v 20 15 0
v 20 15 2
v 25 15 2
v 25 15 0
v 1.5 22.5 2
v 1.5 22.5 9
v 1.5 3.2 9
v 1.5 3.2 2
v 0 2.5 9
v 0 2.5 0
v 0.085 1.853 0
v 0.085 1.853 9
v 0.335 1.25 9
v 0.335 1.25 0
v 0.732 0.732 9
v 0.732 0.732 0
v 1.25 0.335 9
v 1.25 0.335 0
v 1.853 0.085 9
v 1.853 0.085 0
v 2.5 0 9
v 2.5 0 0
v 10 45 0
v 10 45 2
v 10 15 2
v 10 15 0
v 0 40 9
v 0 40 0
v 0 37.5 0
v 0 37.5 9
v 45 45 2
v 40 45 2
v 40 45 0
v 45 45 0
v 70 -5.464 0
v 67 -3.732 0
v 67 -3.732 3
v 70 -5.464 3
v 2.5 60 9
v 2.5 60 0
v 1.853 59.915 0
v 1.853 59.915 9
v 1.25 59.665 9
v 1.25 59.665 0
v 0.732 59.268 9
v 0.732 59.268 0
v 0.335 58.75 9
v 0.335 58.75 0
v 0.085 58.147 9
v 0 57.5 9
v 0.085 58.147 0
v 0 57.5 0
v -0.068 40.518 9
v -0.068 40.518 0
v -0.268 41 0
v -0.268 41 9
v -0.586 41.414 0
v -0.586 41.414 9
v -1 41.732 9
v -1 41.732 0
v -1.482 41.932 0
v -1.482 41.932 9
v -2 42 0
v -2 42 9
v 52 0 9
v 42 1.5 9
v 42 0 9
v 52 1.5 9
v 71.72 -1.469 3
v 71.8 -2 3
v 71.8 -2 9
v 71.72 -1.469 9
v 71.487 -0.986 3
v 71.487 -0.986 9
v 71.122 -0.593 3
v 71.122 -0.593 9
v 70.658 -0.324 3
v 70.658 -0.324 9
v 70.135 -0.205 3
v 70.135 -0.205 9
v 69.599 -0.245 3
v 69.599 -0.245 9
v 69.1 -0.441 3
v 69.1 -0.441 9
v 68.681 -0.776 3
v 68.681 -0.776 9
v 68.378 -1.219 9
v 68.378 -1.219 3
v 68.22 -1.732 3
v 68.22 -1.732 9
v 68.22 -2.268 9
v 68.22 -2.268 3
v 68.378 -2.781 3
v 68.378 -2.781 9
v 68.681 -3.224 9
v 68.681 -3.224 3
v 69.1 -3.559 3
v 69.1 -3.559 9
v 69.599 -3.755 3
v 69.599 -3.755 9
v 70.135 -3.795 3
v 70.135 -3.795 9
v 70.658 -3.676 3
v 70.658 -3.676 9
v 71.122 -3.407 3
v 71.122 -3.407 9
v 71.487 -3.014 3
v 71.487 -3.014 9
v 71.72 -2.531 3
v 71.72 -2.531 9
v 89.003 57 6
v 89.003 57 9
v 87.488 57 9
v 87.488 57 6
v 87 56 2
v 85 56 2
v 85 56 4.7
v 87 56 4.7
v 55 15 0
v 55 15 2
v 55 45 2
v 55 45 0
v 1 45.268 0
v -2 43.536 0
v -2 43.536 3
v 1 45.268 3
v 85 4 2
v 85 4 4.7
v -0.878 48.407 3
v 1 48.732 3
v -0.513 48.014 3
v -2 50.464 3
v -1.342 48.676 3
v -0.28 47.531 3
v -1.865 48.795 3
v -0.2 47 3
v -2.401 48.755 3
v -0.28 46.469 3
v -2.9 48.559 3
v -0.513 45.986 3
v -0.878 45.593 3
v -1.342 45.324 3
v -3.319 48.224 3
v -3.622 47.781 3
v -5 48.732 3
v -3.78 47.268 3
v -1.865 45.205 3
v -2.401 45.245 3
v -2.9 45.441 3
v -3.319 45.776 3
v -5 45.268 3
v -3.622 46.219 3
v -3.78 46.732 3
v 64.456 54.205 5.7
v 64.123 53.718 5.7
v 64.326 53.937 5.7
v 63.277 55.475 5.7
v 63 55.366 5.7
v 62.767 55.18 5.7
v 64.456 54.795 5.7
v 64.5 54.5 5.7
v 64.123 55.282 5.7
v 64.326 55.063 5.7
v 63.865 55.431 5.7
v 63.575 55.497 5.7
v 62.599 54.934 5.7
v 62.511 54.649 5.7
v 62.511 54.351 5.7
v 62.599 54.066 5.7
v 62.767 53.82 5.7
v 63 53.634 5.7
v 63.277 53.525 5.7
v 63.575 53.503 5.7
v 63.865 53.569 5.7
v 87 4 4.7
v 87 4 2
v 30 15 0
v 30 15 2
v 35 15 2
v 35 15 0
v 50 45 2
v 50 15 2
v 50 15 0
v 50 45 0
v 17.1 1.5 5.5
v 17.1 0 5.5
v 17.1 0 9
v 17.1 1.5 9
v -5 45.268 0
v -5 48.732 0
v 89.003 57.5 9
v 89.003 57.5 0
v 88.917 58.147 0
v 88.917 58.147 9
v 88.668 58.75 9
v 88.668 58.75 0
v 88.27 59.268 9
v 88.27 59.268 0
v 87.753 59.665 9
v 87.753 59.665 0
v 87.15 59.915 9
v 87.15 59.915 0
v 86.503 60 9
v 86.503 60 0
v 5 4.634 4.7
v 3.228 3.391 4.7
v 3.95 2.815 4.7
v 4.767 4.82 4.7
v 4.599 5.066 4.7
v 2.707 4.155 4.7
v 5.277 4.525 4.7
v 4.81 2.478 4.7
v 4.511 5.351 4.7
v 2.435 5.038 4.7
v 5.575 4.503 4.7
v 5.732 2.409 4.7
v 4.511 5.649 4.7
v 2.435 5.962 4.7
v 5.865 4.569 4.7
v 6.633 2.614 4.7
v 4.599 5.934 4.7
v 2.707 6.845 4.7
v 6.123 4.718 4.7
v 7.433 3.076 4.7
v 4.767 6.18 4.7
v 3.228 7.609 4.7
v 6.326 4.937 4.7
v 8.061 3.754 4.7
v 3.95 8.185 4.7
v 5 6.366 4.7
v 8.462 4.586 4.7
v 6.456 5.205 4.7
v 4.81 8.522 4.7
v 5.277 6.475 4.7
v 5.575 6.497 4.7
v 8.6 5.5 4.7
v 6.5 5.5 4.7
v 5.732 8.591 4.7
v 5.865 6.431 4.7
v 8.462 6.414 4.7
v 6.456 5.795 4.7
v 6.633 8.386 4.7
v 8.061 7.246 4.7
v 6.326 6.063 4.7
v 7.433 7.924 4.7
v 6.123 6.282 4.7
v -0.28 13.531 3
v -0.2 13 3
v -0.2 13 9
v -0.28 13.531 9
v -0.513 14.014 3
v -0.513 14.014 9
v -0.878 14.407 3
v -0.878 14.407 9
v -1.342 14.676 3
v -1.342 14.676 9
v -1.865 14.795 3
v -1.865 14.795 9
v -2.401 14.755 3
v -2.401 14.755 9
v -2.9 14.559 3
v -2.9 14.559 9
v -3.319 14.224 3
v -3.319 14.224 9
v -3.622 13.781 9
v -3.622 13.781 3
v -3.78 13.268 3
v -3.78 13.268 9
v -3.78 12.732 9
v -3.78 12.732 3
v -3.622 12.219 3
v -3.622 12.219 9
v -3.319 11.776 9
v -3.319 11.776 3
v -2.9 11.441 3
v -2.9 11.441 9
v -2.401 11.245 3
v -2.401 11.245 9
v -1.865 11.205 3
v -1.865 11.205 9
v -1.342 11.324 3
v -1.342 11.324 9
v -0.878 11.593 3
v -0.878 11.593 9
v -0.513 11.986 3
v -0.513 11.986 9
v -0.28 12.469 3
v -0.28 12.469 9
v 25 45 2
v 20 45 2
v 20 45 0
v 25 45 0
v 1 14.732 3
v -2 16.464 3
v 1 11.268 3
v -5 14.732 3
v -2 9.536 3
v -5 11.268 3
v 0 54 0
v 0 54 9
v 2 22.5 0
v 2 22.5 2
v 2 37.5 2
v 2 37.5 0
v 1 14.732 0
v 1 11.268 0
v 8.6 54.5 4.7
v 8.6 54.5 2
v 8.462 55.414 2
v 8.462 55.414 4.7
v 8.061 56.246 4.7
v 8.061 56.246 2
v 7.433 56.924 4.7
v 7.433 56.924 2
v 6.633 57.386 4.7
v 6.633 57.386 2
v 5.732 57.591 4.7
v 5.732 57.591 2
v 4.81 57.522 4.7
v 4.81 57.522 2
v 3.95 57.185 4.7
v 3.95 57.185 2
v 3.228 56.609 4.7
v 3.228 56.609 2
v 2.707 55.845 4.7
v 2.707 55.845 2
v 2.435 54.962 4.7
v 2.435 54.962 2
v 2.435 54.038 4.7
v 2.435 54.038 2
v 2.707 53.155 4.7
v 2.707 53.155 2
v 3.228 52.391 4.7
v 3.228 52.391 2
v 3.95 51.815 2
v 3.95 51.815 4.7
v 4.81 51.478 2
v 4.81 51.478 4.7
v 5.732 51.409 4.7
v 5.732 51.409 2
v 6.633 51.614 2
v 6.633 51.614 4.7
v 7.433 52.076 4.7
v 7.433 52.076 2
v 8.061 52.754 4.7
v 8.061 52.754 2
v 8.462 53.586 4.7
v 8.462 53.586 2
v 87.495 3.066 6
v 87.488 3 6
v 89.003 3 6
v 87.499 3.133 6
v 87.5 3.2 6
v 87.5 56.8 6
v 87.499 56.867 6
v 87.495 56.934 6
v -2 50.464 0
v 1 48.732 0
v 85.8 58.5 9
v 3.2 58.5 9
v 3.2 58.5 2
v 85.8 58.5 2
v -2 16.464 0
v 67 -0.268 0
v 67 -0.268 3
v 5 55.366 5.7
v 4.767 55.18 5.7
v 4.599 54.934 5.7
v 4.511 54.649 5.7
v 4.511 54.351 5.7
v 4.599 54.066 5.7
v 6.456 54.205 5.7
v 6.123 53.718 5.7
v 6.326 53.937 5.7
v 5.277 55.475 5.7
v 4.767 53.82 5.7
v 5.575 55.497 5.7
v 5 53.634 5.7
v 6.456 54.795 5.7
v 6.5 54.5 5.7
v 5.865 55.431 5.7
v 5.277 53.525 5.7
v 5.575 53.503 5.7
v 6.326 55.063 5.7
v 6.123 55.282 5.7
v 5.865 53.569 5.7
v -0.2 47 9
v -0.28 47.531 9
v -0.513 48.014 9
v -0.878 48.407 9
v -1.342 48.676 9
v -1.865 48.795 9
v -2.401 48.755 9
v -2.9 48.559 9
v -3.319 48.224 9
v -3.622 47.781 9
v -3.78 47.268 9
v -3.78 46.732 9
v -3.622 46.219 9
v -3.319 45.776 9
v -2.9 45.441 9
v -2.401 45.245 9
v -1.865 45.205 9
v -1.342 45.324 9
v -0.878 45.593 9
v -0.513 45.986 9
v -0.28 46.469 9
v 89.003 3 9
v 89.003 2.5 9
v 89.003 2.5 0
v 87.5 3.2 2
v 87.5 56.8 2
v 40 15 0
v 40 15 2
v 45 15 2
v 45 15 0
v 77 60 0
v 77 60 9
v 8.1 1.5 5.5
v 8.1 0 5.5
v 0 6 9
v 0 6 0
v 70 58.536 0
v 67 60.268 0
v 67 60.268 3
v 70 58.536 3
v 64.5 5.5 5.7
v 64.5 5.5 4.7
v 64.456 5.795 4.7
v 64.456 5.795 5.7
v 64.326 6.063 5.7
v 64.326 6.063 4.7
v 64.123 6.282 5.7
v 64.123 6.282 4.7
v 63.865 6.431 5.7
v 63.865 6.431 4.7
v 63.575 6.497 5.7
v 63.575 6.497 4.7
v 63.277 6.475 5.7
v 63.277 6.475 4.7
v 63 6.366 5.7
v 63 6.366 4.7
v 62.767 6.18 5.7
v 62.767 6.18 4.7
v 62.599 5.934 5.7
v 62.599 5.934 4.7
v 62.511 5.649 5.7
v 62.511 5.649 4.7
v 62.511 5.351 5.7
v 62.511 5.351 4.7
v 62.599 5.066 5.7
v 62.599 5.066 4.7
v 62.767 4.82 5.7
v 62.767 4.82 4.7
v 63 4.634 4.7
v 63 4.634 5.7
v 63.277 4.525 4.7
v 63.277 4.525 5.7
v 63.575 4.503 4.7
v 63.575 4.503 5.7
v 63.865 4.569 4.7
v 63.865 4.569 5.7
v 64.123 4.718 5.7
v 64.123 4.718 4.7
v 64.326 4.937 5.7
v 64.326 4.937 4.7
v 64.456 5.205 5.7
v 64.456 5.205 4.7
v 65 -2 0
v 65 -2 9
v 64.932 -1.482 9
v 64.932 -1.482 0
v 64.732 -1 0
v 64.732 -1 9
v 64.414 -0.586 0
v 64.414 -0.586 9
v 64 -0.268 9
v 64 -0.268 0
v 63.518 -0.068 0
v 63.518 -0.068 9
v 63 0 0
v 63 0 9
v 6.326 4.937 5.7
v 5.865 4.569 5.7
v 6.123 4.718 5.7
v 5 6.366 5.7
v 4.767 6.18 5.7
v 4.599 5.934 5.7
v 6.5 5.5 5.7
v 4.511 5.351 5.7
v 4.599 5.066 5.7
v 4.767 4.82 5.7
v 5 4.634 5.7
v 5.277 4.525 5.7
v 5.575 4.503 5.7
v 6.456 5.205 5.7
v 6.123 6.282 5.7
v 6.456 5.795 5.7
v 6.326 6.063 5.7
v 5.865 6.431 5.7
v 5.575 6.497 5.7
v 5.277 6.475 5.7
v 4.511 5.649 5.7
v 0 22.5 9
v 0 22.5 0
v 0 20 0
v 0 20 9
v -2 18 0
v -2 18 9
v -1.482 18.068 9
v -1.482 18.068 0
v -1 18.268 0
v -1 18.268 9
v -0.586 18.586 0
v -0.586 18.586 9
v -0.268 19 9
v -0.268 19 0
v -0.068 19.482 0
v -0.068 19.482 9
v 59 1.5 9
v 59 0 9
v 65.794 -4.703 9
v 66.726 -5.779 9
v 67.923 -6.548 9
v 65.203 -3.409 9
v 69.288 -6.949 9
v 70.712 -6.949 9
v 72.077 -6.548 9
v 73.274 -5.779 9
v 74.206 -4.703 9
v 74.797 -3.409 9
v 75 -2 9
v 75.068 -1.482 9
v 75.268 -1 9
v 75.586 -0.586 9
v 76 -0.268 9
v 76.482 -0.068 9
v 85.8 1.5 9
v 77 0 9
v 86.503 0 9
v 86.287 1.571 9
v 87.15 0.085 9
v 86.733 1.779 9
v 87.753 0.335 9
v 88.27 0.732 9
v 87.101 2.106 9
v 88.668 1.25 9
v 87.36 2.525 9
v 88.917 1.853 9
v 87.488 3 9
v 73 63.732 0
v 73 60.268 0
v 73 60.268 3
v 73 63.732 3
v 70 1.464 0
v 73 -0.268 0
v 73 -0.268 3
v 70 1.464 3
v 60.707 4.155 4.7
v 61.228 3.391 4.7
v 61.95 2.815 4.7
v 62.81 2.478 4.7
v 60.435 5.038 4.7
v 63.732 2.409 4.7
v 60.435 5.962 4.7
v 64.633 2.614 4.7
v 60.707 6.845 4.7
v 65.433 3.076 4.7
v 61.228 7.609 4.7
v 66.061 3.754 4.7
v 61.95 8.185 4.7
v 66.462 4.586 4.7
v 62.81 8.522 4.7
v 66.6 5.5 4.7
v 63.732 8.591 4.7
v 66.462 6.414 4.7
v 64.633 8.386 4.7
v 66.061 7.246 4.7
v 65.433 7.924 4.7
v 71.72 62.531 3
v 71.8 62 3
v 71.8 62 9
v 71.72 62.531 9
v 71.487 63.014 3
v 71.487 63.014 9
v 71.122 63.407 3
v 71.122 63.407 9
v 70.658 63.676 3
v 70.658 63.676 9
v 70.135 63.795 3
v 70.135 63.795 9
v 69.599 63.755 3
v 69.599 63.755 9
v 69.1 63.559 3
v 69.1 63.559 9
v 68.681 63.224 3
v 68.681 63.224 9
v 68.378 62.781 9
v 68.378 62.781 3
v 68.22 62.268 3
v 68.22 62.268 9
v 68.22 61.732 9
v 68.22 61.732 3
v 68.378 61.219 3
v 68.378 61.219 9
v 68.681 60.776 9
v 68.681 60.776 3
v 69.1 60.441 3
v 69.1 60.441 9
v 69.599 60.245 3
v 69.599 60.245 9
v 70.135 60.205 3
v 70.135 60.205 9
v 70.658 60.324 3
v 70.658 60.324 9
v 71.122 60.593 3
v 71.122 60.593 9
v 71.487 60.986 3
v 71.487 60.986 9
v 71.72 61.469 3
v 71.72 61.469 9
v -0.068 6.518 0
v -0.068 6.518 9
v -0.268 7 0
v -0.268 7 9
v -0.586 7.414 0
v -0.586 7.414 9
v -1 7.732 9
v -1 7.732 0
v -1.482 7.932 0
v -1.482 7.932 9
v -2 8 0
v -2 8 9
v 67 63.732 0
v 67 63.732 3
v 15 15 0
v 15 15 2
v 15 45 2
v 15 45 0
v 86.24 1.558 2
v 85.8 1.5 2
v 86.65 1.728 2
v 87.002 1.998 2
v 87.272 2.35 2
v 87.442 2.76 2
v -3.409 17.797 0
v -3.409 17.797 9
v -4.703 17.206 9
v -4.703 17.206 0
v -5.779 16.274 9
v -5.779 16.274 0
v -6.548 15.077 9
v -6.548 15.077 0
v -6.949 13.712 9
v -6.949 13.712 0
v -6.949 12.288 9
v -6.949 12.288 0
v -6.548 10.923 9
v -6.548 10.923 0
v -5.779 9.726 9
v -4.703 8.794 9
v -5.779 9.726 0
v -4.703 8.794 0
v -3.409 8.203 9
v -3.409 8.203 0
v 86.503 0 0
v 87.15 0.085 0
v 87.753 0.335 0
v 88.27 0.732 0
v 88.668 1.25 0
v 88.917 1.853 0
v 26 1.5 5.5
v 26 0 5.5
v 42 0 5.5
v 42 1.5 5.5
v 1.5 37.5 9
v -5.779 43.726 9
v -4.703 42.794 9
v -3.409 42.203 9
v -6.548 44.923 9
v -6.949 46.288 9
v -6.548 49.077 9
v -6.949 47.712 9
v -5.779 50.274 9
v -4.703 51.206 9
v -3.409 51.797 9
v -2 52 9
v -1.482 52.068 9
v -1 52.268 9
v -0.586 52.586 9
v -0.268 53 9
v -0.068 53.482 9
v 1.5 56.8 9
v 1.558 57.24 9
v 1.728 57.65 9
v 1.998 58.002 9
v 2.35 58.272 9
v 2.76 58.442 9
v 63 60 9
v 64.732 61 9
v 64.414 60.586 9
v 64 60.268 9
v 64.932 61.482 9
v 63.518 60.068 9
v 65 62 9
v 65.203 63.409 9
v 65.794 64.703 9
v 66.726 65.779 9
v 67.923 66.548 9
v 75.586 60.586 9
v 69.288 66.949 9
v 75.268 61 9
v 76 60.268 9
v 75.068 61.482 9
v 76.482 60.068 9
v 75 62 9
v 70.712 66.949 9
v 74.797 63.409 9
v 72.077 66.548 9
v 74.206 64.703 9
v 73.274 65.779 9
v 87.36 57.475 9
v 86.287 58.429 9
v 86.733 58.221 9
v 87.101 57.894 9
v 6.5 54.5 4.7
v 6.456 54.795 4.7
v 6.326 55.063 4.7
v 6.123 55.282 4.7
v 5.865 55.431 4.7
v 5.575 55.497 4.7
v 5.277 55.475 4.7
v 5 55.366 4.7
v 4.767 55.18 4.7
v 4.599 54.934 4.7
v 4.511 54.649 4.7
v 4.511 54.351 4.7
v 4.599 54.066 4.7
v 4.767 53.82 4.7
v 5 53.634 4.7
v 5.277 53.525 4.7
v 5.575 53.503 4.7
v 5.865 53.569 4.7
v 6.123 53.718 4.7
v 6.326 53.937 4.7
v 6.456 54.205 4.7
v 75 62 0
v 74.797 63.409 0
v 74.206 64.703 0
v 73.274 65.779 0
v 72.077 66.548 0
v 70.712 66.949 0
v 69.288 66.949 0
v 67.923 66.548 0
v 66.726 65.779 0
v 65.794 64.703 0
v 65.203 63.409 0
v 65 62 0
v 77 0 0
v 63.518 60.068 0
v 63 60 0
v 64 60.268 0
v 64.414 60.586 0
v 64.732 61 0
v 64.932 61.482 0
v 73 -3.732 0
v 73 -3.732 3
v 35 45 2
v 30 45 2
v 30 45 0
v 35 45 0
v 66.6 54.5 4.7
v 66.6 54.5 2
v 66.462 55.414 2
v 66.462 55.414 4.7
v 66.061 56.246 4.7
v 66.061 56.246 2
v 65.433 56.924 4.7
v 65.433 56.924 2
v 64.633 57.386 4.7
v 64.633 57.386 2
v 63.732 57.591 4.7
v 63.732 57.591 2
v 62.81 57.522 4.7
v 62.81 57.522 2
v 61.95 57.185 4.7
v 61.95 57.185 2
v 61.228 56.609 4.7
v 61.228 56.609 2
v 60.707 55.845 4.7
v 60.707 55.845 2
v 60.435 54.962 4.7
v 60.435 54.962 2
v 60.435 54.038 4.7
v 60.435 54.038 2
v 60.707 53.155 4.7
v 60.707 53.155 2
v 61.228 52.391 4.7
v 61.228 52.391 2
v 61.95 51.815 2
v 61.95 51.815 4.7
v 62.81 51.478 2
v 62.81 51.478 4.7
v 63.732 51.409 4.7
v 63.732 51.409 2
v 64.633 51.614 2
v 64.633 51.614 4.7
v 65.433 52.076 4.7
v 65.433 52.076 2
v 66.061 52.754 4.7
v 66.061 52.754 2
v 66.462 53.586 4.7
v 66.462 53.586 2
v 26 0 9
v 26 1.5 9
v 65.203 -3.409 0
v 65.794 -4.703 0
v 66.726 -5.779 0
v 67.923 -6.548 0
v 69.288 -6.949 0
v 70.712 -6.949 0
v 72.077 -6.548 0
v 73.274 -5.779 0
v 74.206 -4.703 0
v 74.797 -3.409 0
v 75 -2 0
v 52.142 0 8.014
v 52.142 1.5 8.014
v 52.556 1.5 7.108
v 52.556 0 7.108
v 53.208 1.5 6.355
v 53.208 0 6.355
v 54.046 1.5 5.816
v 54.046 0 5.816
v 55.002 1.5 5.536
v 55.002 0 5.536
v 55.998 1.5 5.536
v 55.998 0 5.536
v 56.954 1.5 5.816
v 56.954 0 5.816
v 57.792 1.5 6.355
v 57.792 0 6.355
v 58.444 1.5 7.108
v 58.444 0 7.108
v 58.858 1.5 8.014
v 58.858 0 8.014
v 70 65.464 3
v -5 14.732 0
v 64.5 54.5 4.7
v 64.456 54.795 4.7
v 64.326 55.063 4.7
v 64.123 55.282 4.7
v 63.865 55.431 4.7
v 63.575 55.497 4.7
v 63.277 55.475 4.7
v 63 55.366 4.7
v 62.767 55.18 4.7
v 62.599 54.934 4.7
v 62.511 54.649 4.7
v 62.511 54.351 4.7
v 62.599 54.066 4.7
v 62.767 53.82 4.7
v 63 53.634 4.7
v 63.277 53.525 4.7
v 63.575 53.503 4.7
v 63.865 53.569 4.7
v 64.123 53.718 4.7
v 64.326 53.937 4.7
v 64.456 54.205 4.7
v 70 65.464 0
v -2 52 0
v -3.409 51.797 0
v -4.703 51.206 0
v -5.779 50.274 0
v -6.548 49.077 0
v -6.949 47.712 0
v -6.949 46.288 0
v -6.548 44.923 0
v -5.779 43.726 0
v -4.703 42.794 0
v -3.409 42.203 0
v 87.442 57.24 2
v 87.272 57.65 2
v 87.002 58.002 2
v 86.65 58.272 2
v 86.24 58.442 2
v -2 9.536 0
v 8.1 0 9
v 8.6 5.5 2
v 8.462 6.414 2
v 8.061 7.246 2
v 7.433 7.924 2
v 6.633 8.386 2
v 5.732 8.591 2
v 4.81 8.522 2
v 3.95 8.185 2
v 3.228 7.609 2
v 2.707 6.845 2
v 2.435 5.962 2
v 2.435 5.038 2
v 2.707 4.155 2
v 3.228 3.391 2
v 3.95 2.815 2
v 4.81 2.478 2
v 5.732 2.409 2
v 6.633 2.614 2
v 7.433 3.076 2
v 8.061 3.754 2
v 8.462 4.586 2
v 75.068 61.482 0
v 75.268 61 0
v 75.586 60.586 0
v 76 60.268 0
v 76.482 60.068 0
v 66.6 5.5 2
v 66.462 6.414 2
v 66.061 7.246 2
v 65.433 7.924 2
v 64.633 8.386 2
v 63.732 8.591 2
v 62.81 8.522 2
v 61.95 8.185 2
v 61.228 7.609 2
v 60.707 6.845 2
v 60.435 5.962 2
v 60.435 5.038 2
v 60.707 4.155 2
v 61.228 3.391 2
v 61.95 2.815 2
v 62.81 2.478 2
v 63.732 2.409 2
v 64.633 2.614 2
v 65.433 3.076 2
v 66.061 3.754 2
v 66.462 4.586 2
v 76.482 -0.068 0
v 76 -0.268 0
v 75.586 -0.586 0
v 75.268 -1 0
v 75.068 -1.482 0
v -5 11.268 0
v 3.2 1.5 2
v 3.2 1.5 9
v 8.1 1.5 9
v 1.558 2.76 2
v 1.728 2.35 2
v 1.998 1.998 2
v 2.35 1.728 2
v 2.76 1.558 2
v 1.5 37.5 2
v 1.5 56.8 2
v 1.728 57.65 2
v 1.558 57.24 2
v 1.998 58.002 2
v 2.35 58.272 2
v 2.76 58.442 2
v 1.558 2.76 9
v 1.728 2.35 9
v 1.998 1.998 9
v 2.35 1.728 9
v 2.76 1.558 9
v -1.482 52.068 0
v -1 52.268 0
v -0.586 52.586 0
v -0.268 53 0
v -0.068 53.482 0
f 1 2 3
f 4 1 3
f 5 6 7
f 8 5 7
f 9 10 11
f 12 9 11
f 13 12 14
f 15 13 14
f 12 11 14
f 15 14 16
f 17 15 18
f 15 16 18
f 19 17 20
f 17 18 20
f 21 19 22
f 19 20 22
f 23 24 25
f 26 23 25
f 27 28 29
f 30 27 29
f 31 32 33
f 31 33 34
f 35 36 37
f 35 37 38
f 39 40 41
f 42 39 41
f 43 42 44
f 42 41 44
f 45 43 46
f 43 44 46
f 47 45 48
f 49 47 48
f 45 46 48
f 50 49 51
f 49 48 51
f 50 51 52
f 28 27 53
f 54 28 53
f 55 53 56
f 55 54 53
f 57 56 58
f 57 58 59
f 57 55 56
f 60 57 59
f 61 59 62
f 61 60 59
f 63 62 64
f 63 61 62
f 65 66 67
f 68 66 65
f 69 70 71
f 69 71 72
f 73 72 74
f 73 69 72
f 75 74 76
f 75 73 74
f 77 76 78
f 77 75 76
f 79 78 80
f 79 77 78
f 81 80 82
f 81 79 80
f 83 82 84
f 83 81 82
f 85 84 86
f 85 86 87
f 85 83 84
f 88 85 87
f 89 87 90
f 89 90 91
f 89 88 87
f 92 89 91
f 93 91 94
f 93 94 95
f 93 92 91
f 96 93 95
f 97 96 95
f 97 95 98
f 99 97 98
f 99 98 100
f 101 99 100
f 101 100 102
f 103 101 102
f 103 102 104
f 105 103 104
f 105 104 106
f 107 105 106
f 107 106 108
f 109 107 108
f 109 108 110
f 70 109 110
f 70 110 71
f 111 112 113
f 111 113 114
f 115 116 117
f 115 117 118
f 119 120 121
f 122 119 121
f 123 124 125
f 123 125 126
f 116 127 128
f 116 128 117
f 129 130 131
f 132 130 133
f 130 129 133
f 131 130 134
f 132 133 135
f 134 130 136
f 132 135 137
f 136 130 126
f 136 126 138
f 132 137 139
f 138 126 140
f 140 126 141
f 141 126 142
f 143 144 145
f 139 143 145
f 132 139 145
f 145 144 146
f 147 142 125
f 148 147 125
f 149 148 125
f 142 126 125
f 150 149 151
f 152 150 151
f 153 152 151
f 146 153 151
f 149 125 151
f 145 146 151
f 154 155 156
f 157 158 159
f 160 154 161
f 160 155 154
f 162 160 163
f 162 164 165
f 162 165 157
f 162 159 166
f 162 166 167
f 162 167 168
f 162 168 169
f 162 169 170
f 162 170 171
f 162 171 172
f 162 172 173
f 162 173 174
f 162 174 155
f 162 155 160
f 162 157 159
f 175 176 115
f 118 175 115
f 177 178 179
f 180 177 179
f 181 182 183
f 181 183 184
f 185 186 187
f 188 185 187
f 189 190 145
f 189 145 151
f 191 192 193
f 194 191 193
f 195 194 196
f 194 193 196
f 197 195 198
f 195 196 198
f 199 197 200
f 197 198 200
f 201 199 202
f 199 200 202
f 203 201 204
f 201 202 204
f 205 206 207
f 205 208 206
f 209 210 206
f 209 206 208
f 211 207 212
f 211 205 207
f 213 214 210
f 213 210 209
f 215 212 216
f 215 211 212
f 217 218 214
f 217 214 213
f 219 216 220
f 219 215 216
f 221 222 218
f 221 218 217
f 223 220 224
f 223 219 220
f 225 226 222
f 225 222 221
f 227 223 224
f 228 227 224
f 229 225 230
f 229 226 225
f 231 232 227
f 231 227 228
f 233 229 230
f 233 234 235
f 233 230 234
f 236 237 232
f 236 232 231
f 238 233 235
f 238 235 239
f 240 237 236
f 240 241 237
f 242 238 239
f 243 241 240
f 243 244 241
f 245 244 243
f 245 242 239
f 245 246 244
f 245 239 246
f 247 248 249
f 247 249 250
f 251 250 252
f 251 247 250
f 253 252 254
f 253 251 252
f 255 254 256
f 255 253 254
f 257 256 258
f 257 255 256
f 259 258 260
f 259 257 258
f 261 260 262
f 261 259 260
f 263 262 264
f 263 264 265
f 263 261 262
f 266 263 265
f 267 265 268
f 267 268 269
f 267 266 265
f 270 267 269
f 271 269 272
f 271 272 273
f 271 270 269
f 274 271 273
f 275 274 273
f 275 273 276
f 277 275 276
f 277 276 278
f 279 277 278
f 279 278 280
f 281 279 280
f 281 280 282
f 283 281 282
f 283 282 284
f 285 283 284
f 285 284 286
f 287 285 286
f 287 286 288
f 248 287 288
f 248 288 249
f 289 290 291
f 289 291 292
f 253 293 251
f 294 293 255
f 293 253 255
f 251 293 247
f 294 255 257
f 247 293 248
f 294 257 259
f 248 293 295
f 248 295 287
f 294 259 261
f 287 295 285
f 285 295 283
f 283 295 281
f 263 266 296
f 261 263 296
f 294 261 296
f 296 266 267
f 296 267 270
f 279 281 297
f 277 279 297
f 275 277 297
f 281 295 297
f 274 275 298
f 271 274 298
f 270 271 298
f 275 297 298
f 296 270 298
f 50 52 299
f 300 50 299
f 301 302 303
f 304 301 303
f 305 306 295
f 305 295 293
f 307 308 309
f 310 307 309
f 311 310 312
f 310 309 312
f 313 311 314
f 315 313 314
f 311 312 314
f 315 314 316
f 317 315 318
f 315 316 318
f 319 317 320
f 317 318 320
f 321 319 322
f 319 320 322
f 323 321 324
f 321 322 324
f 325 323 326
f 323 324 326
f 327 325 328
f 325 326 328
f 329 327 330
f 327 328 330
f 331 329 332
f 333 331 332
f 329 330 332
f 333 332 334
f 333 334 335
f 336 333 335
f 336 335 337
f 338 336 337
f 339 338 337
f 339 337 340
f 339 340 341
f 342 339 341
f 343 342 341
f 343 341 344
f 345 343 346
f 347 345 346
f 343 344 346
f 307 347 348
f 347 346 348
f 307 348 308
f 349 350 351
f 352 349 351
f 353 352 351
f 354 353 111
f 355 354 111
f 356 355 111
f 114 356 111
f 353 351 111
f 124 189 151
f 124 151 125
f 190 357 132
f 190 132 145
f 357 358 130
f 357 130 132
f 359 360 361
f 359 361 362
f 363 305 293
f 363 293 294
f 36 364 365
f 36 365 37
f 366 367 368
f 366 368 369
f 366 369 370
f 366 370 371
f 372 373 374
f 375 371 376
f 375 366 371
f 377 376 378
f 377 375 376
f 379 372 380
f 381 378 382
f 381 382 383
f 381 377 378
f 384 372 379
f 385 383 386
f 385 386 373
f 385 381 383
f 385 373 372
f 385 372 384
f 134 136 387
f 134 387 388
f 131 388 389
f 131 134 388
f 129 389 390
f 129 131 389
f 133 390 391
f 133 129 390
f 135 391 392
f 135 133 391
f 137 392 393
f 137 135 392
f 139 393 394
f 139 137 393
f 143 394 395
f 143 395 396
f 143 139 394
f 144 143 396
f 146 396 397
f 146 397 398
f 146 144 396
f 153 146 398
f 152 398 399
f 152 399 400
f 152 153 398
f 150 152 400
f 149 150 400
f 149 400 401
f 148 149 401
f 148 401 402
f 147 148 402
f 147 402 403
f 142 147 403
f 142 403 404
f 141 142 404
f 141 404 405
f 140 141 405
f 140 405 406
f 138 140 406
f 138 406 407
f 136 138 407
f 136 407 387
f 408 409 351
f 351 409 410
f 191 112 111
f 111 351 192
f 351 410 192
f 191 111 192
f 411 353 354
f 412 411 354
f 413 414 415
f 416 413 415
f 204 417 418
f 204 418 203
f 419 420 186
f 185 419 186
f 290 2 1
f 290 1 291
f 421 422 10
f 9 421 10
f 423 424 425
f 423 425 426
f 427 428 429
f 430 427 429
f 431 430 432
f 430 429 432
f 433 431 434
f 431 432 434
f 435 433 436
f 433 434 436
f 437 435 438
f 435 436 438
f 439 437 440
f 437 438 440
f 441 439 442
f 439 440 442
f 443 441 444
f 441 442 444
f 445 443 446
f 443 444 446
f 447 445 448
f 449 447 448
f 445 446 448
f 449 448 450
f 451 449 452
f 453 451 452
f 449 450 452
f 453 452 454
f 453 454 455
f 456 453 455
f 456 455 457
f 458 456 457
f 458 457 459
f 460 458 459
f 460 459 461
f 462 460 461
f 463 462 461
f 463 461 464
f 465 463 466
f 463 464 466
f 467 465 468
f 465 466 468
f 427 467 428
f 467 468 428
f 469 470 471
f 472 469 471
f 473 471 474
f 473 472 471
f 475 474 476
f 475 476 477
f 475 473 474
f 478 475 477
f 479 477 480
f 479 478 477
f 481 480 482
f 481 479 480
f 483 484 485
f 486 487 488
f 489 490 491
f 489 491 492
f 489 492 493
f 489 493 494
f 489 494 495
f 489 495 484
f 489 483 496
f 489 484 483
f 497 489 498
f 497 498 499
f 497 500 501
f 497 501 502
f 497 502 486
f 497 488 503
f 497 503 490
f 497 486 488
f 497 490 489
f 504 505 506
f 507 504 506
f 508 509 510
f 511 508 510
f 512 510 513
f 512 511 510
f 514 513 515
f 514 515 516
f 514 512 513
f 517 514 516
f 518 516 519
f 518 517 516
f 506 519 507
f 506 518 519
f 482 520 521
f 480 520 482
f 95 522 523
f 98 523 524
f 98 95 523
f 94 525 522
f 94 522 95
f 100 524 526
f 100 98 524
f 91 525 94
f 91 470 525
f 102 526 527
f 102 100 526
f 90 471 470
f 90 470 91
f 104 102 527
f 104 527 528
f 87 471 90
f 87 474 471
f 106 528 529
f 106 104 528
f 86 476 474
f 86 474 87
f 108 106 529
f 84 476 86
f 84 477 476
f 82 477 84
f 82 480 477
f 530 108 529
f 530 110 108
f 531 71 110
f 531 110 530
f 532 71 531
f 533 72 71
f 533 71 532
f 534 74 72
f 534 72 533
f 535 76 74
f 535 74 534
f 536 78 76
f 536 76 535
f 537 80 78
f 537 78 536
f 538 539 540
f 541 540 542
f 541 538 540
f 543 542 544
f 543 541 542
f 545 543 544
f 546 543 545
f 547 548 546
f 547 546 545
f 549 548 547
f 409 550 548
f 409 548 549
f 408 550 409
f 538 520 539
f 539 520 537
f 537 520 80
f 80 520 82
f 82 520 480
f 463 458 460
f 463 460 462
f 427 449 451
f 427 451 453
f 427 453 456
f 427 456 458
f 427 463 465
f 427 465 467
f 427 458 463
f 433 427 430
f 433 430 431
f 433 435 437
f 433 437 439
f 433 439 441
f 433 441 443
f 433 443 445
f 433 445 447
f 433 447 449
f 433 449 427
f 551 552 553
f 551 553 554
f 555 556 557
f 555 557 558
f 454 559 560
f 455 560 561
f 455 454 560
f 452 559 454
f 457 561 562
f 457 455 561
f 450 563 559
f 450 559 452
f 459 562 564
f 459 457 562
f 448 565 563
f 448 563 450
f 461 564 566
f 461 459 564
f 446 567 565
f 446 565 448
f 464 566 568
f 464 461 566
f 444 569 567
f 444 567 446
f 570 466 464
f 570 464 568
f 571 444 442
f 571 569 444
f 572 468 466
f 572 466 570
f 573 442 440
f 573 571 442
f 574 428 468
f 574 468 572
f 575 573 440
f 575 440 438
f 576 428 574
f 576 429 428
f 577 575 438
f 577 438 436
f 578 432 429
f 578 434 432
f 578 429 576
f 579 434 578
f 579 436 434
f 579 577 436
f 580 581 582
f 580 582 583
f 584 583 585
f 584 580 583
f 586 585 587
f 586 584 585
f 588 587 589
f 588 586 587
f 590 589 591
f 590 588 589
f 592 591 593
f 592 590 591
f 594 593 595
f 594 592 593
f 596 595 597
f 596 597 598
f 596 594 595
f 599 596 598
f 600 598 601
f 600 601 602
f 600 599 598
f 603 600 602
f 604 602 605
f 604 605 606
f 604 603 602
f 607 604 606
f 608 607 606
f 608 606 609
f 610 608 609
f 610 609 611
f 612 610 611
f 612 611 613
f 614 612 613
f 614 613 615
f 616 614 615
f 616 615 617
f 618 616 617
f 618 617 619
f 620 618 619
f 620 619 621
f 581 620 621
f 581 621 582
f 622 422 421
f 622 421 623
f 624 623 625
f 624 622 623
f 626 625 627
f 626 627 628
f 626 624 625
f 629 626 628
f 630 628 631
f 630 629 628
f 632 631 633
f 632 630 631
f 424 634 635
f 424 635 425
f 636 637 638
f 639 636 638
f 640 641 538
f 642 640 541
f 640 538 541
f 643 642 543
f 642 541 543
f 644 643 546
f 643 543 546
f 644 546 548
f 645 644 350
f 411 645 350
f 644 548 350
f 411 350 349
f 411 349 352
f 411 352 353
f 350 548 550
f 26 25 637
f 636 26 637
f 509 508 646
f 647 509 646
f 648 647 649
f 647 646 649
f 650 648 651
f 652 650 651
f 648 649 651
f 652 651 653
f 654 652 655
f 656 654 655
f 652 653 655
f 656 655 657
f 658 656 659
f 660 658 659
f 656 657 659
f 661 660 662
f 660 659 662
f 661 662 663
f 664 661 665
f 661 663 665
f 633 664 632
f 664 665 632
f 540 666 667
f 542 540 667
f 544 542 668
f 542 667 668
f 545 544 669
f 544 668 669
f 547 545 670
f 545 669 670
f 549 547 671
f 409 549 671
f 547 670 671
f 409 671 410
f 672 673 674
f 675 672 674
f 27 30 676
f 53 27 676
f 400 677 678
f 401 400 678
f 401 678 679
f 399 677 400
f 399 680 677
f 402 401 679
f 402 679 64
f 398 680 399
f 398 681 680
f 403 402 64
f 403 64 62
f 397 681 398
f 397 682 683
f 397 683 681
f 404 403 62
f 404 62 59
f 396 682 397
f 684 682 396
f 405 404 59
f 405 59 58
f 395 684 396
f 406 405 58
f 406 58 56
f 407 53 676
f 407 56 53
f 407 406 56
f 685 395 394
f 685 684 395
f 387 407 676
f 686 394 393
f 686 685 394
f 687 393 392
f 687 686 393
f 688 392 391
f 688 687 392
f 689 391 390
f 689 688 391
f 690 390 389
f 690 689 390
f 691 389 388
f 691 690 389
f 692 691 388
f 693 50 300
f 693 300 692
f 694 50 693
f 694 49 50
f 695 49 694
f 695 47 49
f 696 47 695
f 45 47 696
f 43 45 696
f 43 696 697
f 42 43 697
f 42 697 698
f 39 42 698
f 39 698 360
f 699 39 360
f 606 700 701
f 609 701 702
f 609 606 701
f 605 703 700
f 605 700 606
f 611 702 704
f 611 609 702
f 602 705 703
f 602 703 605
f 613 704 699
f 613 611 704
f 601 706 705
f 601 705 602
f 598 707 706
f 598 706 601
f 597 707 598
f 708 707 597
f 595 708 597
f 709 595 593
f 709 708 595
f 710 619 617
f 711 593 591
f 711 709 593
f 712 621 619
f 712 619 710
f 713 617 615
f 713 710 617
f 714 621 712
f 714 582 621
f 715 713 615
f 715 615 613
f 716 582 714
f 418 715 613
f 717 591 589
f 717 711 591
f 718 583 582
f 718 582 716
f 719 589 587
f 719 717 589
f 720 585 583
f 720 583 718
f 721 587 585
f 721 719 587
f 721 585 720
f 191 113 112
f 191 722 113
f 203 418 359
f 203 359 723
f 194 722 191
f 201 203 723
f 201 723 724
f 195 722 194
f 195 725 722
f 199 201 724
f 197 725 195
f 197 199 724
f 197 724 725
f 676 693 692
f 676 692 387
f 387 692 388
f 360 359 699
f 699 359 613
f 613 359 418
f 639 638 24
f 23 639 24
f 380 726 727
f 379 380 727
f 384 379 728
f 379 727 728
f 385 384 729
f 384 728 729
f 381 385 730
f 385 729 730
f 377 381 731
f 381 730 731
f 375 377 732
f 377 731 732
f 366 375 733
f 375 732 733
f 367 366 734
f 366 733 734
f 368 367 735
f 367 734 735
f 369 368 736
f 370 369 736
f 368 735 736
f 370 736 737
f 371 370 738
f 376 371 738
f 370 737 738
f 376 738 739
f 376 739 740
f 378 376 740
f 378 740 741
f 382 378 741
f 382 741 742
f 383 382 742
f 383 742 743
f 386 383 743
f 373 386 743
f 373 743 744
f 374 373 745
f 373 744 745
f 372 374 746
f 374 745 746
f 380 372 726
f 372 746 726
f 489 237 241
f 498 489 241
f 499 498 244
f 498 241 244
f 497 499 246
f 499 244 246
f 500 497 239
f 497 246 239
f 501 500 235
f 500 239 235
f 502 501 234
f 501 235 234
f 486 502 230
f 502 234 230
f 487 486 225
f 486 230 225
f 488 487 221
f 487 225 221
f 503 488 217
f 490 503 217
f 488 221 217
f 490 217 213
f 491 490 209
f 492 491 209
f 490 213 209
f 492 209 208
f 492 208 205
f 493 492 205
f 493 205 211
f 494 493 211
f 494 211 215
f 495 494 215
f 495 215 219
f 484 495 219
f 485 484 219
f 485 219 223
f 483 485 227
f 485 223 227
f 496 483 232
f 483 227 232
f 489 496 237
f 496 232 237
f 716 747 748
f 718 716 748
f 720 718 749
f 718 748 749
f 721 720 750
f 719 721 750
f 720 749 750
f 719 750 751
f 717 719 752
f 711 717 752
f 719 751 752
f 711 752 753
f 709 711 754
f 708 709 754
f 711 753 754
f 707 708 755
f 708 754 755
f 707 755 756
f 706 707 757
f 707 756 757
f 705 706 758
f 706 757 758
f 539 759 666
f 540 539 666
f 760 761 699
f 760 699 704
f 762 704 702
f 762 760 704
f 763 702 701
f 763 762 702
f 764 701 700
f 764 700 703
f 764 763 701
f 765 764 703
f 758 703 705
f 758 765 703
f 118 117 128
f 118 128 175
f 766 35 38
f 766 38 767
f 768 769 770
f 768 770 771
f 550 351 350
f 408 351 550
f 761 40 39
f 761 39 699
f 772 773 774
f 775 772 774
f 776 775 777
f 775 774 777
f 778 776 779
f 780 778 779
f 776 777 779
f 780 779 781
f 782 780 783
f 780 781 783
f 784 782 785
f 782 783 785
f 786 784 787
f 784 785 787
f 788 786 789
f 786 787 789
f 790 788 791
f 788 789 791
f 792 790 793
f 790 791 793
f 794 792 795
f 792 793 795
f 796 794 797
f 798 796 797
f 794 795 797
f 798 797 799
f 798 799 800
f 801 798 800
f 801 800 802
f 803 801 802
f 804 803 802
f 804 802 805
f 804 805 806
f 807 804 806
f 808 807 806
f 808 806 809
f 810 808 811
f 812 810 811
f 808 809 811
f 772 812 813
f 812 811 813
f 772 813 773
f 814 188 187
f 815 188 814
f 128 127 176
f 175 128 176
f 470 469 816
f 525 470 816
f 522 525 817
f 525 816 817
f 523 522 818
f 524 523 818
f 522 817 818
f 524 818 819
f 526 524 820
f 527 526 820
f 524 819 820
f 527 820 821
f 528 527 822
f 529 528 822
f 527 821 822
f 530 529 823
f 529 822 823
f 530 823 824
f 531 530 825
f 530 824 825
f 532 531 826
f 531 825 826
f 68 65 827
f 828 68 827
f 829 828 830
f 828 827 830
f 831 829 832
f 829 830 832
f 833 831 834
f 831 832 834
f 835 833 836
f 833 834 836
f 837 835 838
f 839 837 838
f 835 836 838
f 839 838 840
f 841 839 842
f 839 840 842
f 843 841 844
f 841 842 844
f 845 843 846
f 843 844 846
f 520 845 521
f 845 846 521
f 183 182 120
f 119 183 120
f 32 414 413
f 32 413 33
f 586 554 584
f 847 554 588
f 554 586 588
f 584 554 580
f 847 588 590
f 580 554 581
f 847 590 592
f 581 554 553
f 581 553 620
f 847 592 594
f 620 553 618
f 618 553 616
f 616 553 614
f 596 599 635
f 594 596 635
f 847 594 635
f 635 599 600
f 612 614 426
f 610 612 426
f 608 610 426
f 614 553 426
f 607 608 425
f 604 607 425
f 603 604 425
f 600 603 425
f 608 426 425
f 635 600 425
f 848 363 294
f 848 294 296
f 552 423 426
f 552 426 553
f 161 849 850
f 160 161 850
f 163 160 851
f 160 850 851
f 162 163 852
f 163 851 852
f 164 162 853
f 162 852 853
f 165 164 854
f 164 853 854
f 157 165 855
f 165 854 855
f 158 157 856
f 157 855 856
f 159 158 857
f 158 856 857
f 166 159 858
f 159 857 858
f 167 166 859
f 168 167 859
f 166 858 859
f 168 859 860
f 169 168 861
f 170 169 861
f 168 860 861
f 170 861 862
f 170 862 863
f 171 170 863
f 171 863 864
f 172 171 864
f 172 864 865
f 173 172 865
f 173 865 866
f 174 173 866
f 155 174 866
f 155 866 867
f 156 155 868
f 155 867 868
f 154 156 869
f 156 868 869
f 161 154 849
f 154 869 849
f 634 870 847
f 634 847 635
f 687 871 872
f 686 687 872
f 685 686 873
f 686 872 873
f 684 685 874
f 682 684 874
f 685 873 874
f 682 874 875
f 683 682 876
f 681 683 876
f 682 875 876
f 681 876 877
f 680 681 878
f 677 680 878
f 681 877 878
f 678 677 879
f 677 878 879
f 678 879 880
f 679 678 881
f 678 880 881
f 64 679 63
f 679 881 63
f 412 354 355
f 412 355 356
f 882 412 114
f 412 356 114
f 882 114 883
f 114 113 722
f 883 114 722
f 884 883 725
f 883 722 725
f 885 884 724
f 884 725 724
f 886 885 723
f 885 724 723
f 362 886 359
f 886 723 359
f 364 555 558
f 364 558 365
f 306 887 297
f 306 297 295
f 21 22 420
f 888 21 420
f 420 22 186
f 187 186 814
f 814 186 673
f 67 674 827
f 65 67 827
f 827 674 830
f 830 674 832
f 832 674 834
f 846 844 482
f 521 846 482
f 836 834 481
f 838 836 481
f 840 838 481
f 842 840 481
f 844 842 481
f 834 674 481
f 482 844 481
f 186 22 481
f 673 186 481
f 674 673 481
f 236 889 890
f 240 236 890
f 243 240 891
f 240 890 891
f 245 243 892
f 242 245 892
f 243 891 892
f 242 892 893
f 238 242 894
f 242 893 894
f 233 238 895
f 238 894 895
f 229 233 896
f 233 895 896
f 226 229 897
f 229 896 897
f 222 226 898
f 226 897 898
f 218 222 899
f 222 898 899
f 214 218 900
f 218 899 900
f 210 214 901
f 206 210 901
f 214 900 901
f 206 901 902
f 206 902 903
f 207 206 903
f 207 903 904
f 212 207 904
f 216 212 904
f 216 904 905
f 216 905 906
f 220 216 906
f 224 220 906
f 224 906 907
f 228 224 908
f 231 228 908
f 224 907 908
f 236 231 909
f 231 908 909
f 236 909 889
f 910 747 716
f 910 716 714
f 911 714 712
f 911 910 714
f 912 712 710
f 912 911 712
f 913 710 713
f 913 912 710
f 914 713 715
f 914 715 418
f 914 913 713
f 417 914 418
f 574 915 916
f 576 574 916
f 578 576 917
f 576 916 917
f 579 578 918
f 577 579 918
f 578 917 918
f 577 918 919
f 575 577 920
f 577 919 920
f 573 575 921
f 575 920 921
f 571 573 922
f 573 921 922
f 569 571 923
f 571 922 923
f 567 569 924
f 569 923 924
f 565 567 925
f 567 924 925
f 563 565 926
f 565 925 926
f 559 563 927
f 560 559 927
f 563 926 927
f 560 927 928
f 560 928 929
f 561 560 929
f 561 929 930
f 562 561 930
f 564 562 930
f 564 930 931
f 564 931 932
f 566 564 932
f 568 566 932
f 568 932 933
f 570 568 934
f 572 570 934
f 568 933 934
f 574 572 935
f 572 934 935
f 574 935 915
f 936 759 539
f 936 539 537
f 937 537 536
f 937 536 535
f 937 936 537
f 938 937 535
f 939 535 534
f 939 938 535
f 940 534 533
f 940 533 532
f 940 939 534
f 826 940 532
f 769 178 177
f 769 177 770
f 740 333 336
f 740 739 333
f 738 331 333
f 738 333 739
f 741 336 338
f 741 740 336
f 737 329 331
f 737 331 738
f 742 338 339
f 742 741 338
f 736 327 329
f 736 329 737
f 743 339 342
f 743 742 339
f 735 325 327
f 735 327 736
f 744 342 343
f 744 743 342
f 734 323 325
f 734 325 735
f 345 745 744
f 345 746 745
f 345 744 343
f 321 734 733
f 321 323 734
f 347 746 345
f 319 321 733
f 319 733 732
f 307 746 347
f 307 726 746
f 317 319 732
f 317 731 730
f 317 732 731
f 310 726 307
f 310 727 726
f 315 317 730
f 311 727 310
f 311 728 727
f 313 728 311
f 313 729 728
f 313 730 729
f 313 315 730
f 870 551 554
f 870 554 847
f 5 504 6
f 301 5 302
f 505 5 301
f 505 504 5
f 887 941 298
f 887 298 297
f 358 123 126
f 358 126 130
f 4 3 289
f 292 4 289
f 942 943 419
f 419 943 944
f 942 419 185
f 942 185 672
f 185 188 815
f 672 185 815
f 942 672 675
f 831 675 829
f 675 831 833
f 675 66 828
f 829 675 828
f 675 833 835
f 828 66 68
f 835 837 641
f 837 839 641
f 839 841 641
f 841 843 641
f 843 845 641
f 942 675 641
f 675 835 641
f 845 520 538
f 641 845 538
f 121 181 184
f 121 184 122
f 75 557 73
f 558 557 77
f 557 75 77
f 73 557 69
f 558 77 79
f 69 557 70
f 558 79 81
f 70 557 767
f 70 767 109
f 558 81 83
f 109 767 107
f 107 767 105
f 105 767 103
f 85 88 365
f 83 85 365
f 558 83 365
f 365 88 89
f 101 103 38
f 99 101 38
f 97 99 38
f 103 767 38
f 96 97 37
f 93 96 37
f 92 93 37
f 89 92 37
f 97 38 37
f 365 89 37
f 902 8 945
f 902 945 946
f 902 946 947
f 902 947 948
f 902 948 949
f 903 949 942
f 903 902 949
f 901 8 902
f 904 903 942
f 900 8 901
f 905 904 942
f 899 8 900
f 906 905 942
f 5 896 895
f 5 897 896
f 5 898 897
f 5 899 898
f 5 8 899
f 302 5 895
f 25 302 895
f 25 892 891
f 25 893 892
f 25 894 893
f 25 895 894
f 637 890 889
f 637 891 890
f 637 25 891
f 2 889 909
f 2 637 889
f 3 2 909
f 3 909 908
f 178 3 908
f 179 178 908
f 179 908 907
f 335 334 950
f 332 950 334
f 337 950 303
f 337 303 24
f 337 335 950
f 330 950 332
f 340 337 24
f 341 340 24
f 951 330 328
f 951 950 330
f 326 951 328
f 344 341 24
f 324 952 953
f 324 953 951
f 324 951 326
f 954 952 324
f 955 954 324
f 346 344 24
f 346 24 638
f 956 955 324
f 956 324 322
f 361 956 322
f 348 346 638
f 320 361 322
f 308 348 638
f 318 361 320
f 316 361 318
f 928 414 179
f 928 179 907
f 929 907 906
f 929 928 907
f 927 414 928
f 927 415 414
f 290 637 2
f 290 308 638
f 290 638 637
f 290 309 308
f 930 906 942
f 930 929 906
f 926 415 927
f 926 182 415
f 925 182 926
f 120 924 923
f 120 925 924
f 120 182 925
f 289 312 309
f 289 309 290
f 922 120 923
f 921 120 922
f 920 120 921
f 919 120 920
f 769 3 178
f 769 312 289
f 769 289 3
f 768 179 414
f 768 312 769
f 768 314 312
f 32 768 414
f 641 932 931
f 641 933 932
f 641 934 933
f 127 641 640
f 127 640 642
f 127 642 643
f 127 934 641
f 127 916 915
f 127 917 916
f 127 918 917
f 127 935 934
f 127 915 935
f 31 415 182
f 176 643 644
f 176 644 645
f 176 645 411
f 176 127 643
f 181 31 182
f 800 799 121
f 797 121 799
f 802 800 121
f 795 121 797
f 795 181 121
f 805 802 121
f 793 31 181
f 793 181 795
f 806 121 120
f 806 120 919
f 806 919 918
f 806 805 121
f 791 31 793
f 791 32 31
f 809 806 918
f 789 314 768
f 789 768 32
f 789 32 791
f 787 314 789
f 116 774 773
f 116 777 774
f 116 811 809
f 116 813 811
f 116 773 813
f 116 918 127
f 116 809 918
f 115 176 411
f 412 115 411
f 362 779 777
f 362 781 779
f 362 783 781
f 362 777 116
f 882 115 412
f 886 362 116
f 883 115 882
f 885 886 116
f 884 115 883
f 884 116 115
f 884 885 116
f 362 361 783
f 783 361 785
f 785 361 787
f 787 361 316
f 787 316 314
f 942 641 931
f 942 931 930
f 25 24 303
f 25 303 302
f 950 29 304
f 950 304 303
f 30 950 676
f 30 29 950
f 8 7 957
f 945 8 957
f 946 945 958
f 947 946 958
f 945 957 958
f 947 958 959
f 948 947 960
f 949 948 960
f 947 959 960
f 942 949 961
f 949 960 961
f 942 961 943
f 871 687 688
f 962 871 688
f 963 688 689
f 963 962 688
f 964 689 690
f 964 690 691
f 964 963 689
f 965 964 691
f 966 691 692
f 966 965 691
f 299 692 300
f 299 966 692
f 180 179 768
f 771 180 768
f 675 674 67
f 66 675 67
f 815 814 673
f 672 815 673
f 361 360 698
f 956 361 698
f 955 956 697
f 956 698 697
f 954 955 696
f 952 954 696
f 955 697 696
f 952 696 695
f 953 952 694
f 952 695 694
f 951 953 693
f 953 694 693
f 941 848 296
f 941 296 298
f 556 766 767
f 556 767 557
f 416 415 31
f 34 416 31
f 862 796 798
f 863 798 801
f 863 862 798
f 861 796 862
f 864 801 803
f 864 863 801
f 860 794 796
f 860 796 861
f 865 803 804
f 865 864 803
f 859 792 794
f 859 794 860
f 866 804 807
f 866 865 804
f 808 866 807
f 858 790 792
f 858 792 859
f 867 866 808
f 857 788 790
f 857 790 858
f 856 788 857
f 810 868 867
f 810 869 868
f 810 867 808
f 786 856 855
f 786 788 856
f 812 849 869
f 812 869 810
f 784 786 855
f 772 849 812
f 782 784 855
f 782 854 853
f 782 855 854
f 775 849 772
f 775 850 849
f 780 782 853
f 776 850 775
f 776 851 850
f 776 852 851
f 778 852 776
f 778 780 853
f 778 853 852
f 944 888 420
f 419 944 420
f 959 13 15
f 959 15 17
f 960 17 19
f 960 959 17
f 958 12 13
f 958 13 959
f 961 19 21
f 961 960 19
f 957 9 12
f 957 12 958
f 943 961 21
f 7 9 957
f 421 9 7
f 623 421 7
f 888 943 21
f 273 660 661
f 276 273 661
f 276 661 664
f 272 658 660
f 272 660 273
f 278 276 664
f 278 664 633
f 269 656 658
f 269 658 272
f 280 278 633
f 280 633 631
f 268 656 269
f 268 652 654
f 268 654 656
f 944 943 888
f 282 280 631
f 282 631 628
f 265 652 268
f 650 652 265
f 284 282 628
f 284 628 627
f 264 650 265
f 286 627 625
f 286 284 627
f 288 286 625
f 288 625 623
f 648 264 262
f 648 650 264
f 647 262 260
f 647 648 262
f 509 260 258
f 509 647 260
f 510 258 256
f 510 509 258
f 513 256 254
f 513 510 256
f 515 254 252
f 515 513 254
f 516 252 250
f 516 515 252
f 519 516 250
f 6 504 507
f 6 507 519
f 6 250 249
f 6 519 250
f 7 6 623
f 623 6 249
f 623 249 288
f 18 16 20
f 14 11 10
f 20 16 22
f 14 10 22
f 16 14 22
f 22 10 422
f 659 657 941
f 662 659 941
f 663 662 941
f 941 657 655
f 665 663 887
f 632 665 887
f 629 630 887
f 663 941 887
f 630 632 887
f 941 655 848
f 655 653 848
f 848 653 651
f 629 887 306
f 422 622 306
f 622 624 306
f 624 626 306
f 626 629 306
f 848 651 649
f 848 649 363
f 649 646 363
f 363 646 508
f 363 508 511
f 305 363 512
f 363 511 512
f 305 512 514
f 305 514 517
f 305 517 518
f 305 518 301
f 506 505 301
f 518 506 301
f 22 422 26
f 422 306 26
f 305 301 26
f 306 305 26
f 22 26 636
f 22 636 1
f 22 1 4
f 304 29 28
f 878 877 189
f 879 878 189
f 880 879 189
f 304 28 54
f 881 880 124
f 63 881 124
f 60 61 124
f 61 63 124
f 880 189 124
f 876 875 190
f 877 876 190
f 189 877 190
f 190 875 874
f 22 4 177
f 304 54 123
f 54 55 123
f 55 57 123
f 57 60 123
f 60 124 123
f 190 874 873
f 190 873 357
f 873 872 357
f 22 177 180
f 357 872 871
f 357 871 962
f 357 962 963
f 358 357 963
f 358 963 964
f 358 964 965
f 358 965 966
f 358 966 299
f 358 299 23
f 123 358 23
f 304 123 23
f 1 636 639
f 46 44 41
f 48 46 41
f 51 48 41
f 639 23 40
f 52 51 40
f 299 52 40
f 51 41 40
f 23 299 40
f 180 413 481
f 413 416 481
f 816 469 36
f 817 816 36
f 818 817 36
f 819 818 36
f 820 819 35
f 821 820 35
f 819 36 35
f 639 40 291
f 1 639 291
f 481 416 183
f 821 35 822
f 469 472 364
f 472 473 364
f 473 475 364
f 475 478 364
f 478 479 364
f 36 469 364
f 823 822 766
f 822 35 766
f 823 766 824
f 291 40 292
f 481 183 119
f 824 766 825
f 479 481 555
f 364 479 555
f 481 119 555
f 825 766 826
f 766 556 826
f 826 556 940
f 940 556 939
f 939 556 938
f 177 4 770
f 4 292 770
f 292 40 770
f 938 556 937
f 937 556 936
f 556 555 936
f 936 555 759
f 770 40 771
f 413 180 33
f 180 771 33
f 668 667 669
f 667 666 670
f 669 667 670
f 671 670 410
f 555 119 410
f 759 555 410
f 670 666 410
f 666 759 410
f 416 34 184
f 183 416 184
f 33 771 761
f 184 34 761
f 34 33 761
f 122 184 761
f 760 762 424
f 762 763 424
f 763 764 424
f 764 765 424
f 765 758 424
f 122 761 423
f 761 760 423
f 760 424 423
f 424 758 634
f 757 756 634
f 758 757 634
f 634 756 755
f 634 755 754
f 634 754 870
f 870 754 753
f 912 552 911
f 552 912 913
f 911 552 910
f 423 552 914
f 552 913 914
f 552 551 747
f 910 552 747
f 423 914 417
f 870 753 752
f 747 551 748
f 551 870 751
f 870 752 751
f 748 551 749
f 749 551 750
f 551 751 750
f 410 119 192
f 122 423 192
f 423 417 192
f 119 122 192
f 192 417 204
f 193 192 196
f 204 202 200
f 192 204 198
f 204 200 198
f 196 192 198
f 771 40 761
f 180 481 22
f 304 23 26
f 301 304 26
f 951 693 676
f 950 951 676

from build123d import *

# Parameters (mm, degrees)
SKETCH_R        = 1.8
PAD_DEPTH       = 9
POCKET_DEPTH    = 7
SKETCH002_R     = 3.1
SKETCH002_W     = 2
SKETCH002_H     = 52
PAD001_DEPTH    = 2.7
SKETCH003_R     = 1
PAD002_DEPTH    = 1
POCKET001_DEPTH = 2
POCKET002_DEPTH = 2
SKETCH006_R     = 3.5
POCKET003_DEPTH = 5
POCKET004_DEPTH = 3
SKETCH009_W     = 5
SKETCH009_H     = 30
POCKET005_DEPTH = 5


with BuildPart() as part:
    # Sketch → Pad (new body)
    with BuildSketch(Plane.XY):
        with BuildLine():
            Line((89.002639, 2.5), (89.002639, 57.5))
            ThreePointArc((89.002639, 57.5), (88.270406, 59.267767), (86.502639, 60))
            Line((77, 60), (86.502639, 60))
            ThreePointArc((75, 62), (75.585786, 60.585786), (77, 60))
            ThreePointArc((75, 62), (70, 67), (65, 62))
            ThreePointArc((63, 60), (64.414214, 60.585786), (65, 62))
            Line((2.5, 60), (63, 60))
            ThreePointArc((2.5, 60), (0.732233, 59.267767), (0, 57.500001))
            Line((0, 57.500001), (0, 54))
            ThreePointArc((-2, 52), (-0.585786, 52.585786), (0, 54))
            ThreePointArc((-2, 52), (-7, 47), (-2, 42))
            ThreePointArc((0, 40), (-0.585786, 41.414214), (-2, 42))
            Line((0, 40), (0, 20))
            ThreePointArc((-2, 18), (-0.585786, 18.585786), (0, 20))
            ThreePointArc((-2, 18), (-7, 13), (-2, 8))
            ThreePointArc((0, 6), (-0.585786, 7.414214), (-2, 8))
            Line((0, 6), (0, 2.499999))
            ThreePointArc((0, 2.499999), (0.732233, 0.732233), (2.5, 0))
            Line((2.5, 0), (63, 0))
            ThreePointArc((65, -2), (64.414214, -0.585786), (63, 0))
            ThreePointArc((65, -2), (70, -7), (75, -2))
            ThreePointArc((77, 0), (75.585786, -0.585786), (75, -2))
            Line((77, 0), (86.502639, 0))
            ThreePointArc((86.502639, 0), (88.270406, 0.732233), (89.002639, 2.5))
        make_face()
        with Locations((70, 62)):
            Circle(SKETCH_R, mode=Mode.SUBTRACT)
        with Locations((-2, 47)):
            Circle(SKETCH_R, mode=Mode.SUBTRACT)
        with Locations((-2, 13)):
            Circle(SKETCH_R, mode=Mode.SUBTRACT)
        with Locations((70, -2)):
            Circle(SKETCH_R, mode=Mode.SUBTRACT)
    extrude(amount=PAD_DEPTH)

    # Sketch001 → Pocket (cut)
    with BuildSketch(Plane.XY.offset(9)):
        with BuildLine():
            Line((87.5, 3.2), (87.5, 56.8))
            ThreePointArc((87.5, 56.8), (87.002082, 58.002081), (85.8, 58.5))
            Line((3.199992, 58.5), (85.8, 58.5))
            ThreePointArc((3.199992, 58.5), (1.997916, 58.002079), (1.5, 56.8))
            Line((1.5, 56.8), (1.5, 3.2))
            ThreePointArc((1.5, 3.2), (1.997916, 1.997921), (3.199992, 1.5))
            Line((3.199992, 1.5), (85.8, 1.5))
            ThreePointArc((85.8, 1.5), (87.002082, 1.997918), (87.5, 3.2))
        make_face()
    extrude(amount=-POCKET_DEPTH, mode=Mode.SUBTRACT)

    # Sketch002 → Pad001 (new body)
    with BuildSketch(Plane.XY.offset(2)):
        with Locations((5.5, 5.5)):
            Circle(SKETCH002_R)
        with Locations((5.5, 54.5)):
            Circle(SKETCH002_R)
        with Locations((63.5, 54.5)):
            Circle(SKETCH002_R)
        with Locations((63.5, 5.5)):
            Circle(SKETCH002_R)
        with Locations((86, 30)):
            Rectangle(SKETCH002_W, SKETCH002_H)
    extrude(amount=PAD001_DEPTH)

    # Sketch003 → Pad002 (new body)
    with BuildSketch(Plane.XY.offset(4.7)):
        with Locations((5.5, 54.5)):
            Circle(SKETCH003_R)
        with Locations((63.5, 54.5)):
            Circle(SKETCH003_R)
        with Locations((63.5, 5.5)):
            Circle(SKETCH003_R)
        with Locations((5.5, 5.5)):
            Circle(SKETCH003_R)
    extrude(amount=PAD002_DEPTH)

    # Sketch004 → Pocket001 (cut)
    with BuildSketch(Plane(origin=(0, 0, 0), x_dir=(0, -1, 0), z_dir=(-1, 0, 0))):
        Polygon((-37.5, 9), (-22.5, 9), (-22.5, 0), (-30, 0), (-37.5, 0), align=None)
    extrude(amount=-POCKET001_DEPTH, mode=Mode.SUBTRACT)

    # Sketch005 → Pocket002 (cut)
    with BuildSketch(Plane.YZ.offset(89.002639)):
        Polygon((3, 9), (57, 9), (57, 6), (30, 6), (3, 6), align=None)
    extrude(amount=-POCKET002_DEPTH, mode=Mode.SUBTRACT)

    # Sketch006 → Pocket003 (cut)
    with BuildSketch(Plane.XZ):
        with Locations((55.5, 9)):
            Circle(SKETCH006_R)
        Polygon((42, 5.5), (42, 13.5), (26, 13.5), (26, 5.5), (34, 5.5), align=None)
        Polygon((17.1, 5.5), (17.1, 9), (8.1, 9), (8.1, 5.5), (12.6, 5.5), align=None)
    extrude(amount=-POCKET003_DEPTH, mode=Mode.SUBTRACT)

    # Sketch008 → Pocket004 (cut)
    with BuildSketch(Plane(origin=(0, 0, 0), x_dir=(1, 0, 0), z_dir=(0, 0, -1))):
        Polygon((-5, -14.732051), (-5, -11.267949), (-2, -9.535898), (1, -11.267949), (1, -14.732051), (-2, -16.464102), align=None)
        Polygon((-5, -48.732051), (-5, -45.267949), (-2, -43.535898), (1, -45.267949), (1, -48.732051), (-2, -50.464102), align=None)
        Polygon((67, 0.267949), (67, 3.732051), (70, 5.464102), (73, 3.732051), (73, 0.267949), (70, -1.464102), align=None)
        Polygon((67, -63.732051), (67, -60.267949), (70, -58.535898), (73, -60.267949), (73, -63.732051), (70, -65.464102), align=None)
    extrude(amount=-POCKET004_DEPTH, mode=Mode.SUBTRACT)

    # Sketch009 → Pocket005 (cut)
    with BuildSketch(Plane.XY.offset(2)):
        Polygon((10, 15), (15, 15), (15, 45), (10, 45), (10, 30), align=None)
        with Locations((22.5, 30)):
            Rectangle(SKETCH009_W, SKETCH009_H)
        with Locations((32.5, 30)):
            Rectangle(SKETCH009_W, SKETCH009_H)
        with Locations((42.5, 30)):
            Rectangle(SKETCH009_W, SKETCH009_H)
        with Locations((52.5, 30)):
            Rectangle(SKETCH009_W, SKETCH009_H)
    extrude(amount=-POCKET005_DEPTH, mode=Mode.SUBTRACT)


solid = part.part
